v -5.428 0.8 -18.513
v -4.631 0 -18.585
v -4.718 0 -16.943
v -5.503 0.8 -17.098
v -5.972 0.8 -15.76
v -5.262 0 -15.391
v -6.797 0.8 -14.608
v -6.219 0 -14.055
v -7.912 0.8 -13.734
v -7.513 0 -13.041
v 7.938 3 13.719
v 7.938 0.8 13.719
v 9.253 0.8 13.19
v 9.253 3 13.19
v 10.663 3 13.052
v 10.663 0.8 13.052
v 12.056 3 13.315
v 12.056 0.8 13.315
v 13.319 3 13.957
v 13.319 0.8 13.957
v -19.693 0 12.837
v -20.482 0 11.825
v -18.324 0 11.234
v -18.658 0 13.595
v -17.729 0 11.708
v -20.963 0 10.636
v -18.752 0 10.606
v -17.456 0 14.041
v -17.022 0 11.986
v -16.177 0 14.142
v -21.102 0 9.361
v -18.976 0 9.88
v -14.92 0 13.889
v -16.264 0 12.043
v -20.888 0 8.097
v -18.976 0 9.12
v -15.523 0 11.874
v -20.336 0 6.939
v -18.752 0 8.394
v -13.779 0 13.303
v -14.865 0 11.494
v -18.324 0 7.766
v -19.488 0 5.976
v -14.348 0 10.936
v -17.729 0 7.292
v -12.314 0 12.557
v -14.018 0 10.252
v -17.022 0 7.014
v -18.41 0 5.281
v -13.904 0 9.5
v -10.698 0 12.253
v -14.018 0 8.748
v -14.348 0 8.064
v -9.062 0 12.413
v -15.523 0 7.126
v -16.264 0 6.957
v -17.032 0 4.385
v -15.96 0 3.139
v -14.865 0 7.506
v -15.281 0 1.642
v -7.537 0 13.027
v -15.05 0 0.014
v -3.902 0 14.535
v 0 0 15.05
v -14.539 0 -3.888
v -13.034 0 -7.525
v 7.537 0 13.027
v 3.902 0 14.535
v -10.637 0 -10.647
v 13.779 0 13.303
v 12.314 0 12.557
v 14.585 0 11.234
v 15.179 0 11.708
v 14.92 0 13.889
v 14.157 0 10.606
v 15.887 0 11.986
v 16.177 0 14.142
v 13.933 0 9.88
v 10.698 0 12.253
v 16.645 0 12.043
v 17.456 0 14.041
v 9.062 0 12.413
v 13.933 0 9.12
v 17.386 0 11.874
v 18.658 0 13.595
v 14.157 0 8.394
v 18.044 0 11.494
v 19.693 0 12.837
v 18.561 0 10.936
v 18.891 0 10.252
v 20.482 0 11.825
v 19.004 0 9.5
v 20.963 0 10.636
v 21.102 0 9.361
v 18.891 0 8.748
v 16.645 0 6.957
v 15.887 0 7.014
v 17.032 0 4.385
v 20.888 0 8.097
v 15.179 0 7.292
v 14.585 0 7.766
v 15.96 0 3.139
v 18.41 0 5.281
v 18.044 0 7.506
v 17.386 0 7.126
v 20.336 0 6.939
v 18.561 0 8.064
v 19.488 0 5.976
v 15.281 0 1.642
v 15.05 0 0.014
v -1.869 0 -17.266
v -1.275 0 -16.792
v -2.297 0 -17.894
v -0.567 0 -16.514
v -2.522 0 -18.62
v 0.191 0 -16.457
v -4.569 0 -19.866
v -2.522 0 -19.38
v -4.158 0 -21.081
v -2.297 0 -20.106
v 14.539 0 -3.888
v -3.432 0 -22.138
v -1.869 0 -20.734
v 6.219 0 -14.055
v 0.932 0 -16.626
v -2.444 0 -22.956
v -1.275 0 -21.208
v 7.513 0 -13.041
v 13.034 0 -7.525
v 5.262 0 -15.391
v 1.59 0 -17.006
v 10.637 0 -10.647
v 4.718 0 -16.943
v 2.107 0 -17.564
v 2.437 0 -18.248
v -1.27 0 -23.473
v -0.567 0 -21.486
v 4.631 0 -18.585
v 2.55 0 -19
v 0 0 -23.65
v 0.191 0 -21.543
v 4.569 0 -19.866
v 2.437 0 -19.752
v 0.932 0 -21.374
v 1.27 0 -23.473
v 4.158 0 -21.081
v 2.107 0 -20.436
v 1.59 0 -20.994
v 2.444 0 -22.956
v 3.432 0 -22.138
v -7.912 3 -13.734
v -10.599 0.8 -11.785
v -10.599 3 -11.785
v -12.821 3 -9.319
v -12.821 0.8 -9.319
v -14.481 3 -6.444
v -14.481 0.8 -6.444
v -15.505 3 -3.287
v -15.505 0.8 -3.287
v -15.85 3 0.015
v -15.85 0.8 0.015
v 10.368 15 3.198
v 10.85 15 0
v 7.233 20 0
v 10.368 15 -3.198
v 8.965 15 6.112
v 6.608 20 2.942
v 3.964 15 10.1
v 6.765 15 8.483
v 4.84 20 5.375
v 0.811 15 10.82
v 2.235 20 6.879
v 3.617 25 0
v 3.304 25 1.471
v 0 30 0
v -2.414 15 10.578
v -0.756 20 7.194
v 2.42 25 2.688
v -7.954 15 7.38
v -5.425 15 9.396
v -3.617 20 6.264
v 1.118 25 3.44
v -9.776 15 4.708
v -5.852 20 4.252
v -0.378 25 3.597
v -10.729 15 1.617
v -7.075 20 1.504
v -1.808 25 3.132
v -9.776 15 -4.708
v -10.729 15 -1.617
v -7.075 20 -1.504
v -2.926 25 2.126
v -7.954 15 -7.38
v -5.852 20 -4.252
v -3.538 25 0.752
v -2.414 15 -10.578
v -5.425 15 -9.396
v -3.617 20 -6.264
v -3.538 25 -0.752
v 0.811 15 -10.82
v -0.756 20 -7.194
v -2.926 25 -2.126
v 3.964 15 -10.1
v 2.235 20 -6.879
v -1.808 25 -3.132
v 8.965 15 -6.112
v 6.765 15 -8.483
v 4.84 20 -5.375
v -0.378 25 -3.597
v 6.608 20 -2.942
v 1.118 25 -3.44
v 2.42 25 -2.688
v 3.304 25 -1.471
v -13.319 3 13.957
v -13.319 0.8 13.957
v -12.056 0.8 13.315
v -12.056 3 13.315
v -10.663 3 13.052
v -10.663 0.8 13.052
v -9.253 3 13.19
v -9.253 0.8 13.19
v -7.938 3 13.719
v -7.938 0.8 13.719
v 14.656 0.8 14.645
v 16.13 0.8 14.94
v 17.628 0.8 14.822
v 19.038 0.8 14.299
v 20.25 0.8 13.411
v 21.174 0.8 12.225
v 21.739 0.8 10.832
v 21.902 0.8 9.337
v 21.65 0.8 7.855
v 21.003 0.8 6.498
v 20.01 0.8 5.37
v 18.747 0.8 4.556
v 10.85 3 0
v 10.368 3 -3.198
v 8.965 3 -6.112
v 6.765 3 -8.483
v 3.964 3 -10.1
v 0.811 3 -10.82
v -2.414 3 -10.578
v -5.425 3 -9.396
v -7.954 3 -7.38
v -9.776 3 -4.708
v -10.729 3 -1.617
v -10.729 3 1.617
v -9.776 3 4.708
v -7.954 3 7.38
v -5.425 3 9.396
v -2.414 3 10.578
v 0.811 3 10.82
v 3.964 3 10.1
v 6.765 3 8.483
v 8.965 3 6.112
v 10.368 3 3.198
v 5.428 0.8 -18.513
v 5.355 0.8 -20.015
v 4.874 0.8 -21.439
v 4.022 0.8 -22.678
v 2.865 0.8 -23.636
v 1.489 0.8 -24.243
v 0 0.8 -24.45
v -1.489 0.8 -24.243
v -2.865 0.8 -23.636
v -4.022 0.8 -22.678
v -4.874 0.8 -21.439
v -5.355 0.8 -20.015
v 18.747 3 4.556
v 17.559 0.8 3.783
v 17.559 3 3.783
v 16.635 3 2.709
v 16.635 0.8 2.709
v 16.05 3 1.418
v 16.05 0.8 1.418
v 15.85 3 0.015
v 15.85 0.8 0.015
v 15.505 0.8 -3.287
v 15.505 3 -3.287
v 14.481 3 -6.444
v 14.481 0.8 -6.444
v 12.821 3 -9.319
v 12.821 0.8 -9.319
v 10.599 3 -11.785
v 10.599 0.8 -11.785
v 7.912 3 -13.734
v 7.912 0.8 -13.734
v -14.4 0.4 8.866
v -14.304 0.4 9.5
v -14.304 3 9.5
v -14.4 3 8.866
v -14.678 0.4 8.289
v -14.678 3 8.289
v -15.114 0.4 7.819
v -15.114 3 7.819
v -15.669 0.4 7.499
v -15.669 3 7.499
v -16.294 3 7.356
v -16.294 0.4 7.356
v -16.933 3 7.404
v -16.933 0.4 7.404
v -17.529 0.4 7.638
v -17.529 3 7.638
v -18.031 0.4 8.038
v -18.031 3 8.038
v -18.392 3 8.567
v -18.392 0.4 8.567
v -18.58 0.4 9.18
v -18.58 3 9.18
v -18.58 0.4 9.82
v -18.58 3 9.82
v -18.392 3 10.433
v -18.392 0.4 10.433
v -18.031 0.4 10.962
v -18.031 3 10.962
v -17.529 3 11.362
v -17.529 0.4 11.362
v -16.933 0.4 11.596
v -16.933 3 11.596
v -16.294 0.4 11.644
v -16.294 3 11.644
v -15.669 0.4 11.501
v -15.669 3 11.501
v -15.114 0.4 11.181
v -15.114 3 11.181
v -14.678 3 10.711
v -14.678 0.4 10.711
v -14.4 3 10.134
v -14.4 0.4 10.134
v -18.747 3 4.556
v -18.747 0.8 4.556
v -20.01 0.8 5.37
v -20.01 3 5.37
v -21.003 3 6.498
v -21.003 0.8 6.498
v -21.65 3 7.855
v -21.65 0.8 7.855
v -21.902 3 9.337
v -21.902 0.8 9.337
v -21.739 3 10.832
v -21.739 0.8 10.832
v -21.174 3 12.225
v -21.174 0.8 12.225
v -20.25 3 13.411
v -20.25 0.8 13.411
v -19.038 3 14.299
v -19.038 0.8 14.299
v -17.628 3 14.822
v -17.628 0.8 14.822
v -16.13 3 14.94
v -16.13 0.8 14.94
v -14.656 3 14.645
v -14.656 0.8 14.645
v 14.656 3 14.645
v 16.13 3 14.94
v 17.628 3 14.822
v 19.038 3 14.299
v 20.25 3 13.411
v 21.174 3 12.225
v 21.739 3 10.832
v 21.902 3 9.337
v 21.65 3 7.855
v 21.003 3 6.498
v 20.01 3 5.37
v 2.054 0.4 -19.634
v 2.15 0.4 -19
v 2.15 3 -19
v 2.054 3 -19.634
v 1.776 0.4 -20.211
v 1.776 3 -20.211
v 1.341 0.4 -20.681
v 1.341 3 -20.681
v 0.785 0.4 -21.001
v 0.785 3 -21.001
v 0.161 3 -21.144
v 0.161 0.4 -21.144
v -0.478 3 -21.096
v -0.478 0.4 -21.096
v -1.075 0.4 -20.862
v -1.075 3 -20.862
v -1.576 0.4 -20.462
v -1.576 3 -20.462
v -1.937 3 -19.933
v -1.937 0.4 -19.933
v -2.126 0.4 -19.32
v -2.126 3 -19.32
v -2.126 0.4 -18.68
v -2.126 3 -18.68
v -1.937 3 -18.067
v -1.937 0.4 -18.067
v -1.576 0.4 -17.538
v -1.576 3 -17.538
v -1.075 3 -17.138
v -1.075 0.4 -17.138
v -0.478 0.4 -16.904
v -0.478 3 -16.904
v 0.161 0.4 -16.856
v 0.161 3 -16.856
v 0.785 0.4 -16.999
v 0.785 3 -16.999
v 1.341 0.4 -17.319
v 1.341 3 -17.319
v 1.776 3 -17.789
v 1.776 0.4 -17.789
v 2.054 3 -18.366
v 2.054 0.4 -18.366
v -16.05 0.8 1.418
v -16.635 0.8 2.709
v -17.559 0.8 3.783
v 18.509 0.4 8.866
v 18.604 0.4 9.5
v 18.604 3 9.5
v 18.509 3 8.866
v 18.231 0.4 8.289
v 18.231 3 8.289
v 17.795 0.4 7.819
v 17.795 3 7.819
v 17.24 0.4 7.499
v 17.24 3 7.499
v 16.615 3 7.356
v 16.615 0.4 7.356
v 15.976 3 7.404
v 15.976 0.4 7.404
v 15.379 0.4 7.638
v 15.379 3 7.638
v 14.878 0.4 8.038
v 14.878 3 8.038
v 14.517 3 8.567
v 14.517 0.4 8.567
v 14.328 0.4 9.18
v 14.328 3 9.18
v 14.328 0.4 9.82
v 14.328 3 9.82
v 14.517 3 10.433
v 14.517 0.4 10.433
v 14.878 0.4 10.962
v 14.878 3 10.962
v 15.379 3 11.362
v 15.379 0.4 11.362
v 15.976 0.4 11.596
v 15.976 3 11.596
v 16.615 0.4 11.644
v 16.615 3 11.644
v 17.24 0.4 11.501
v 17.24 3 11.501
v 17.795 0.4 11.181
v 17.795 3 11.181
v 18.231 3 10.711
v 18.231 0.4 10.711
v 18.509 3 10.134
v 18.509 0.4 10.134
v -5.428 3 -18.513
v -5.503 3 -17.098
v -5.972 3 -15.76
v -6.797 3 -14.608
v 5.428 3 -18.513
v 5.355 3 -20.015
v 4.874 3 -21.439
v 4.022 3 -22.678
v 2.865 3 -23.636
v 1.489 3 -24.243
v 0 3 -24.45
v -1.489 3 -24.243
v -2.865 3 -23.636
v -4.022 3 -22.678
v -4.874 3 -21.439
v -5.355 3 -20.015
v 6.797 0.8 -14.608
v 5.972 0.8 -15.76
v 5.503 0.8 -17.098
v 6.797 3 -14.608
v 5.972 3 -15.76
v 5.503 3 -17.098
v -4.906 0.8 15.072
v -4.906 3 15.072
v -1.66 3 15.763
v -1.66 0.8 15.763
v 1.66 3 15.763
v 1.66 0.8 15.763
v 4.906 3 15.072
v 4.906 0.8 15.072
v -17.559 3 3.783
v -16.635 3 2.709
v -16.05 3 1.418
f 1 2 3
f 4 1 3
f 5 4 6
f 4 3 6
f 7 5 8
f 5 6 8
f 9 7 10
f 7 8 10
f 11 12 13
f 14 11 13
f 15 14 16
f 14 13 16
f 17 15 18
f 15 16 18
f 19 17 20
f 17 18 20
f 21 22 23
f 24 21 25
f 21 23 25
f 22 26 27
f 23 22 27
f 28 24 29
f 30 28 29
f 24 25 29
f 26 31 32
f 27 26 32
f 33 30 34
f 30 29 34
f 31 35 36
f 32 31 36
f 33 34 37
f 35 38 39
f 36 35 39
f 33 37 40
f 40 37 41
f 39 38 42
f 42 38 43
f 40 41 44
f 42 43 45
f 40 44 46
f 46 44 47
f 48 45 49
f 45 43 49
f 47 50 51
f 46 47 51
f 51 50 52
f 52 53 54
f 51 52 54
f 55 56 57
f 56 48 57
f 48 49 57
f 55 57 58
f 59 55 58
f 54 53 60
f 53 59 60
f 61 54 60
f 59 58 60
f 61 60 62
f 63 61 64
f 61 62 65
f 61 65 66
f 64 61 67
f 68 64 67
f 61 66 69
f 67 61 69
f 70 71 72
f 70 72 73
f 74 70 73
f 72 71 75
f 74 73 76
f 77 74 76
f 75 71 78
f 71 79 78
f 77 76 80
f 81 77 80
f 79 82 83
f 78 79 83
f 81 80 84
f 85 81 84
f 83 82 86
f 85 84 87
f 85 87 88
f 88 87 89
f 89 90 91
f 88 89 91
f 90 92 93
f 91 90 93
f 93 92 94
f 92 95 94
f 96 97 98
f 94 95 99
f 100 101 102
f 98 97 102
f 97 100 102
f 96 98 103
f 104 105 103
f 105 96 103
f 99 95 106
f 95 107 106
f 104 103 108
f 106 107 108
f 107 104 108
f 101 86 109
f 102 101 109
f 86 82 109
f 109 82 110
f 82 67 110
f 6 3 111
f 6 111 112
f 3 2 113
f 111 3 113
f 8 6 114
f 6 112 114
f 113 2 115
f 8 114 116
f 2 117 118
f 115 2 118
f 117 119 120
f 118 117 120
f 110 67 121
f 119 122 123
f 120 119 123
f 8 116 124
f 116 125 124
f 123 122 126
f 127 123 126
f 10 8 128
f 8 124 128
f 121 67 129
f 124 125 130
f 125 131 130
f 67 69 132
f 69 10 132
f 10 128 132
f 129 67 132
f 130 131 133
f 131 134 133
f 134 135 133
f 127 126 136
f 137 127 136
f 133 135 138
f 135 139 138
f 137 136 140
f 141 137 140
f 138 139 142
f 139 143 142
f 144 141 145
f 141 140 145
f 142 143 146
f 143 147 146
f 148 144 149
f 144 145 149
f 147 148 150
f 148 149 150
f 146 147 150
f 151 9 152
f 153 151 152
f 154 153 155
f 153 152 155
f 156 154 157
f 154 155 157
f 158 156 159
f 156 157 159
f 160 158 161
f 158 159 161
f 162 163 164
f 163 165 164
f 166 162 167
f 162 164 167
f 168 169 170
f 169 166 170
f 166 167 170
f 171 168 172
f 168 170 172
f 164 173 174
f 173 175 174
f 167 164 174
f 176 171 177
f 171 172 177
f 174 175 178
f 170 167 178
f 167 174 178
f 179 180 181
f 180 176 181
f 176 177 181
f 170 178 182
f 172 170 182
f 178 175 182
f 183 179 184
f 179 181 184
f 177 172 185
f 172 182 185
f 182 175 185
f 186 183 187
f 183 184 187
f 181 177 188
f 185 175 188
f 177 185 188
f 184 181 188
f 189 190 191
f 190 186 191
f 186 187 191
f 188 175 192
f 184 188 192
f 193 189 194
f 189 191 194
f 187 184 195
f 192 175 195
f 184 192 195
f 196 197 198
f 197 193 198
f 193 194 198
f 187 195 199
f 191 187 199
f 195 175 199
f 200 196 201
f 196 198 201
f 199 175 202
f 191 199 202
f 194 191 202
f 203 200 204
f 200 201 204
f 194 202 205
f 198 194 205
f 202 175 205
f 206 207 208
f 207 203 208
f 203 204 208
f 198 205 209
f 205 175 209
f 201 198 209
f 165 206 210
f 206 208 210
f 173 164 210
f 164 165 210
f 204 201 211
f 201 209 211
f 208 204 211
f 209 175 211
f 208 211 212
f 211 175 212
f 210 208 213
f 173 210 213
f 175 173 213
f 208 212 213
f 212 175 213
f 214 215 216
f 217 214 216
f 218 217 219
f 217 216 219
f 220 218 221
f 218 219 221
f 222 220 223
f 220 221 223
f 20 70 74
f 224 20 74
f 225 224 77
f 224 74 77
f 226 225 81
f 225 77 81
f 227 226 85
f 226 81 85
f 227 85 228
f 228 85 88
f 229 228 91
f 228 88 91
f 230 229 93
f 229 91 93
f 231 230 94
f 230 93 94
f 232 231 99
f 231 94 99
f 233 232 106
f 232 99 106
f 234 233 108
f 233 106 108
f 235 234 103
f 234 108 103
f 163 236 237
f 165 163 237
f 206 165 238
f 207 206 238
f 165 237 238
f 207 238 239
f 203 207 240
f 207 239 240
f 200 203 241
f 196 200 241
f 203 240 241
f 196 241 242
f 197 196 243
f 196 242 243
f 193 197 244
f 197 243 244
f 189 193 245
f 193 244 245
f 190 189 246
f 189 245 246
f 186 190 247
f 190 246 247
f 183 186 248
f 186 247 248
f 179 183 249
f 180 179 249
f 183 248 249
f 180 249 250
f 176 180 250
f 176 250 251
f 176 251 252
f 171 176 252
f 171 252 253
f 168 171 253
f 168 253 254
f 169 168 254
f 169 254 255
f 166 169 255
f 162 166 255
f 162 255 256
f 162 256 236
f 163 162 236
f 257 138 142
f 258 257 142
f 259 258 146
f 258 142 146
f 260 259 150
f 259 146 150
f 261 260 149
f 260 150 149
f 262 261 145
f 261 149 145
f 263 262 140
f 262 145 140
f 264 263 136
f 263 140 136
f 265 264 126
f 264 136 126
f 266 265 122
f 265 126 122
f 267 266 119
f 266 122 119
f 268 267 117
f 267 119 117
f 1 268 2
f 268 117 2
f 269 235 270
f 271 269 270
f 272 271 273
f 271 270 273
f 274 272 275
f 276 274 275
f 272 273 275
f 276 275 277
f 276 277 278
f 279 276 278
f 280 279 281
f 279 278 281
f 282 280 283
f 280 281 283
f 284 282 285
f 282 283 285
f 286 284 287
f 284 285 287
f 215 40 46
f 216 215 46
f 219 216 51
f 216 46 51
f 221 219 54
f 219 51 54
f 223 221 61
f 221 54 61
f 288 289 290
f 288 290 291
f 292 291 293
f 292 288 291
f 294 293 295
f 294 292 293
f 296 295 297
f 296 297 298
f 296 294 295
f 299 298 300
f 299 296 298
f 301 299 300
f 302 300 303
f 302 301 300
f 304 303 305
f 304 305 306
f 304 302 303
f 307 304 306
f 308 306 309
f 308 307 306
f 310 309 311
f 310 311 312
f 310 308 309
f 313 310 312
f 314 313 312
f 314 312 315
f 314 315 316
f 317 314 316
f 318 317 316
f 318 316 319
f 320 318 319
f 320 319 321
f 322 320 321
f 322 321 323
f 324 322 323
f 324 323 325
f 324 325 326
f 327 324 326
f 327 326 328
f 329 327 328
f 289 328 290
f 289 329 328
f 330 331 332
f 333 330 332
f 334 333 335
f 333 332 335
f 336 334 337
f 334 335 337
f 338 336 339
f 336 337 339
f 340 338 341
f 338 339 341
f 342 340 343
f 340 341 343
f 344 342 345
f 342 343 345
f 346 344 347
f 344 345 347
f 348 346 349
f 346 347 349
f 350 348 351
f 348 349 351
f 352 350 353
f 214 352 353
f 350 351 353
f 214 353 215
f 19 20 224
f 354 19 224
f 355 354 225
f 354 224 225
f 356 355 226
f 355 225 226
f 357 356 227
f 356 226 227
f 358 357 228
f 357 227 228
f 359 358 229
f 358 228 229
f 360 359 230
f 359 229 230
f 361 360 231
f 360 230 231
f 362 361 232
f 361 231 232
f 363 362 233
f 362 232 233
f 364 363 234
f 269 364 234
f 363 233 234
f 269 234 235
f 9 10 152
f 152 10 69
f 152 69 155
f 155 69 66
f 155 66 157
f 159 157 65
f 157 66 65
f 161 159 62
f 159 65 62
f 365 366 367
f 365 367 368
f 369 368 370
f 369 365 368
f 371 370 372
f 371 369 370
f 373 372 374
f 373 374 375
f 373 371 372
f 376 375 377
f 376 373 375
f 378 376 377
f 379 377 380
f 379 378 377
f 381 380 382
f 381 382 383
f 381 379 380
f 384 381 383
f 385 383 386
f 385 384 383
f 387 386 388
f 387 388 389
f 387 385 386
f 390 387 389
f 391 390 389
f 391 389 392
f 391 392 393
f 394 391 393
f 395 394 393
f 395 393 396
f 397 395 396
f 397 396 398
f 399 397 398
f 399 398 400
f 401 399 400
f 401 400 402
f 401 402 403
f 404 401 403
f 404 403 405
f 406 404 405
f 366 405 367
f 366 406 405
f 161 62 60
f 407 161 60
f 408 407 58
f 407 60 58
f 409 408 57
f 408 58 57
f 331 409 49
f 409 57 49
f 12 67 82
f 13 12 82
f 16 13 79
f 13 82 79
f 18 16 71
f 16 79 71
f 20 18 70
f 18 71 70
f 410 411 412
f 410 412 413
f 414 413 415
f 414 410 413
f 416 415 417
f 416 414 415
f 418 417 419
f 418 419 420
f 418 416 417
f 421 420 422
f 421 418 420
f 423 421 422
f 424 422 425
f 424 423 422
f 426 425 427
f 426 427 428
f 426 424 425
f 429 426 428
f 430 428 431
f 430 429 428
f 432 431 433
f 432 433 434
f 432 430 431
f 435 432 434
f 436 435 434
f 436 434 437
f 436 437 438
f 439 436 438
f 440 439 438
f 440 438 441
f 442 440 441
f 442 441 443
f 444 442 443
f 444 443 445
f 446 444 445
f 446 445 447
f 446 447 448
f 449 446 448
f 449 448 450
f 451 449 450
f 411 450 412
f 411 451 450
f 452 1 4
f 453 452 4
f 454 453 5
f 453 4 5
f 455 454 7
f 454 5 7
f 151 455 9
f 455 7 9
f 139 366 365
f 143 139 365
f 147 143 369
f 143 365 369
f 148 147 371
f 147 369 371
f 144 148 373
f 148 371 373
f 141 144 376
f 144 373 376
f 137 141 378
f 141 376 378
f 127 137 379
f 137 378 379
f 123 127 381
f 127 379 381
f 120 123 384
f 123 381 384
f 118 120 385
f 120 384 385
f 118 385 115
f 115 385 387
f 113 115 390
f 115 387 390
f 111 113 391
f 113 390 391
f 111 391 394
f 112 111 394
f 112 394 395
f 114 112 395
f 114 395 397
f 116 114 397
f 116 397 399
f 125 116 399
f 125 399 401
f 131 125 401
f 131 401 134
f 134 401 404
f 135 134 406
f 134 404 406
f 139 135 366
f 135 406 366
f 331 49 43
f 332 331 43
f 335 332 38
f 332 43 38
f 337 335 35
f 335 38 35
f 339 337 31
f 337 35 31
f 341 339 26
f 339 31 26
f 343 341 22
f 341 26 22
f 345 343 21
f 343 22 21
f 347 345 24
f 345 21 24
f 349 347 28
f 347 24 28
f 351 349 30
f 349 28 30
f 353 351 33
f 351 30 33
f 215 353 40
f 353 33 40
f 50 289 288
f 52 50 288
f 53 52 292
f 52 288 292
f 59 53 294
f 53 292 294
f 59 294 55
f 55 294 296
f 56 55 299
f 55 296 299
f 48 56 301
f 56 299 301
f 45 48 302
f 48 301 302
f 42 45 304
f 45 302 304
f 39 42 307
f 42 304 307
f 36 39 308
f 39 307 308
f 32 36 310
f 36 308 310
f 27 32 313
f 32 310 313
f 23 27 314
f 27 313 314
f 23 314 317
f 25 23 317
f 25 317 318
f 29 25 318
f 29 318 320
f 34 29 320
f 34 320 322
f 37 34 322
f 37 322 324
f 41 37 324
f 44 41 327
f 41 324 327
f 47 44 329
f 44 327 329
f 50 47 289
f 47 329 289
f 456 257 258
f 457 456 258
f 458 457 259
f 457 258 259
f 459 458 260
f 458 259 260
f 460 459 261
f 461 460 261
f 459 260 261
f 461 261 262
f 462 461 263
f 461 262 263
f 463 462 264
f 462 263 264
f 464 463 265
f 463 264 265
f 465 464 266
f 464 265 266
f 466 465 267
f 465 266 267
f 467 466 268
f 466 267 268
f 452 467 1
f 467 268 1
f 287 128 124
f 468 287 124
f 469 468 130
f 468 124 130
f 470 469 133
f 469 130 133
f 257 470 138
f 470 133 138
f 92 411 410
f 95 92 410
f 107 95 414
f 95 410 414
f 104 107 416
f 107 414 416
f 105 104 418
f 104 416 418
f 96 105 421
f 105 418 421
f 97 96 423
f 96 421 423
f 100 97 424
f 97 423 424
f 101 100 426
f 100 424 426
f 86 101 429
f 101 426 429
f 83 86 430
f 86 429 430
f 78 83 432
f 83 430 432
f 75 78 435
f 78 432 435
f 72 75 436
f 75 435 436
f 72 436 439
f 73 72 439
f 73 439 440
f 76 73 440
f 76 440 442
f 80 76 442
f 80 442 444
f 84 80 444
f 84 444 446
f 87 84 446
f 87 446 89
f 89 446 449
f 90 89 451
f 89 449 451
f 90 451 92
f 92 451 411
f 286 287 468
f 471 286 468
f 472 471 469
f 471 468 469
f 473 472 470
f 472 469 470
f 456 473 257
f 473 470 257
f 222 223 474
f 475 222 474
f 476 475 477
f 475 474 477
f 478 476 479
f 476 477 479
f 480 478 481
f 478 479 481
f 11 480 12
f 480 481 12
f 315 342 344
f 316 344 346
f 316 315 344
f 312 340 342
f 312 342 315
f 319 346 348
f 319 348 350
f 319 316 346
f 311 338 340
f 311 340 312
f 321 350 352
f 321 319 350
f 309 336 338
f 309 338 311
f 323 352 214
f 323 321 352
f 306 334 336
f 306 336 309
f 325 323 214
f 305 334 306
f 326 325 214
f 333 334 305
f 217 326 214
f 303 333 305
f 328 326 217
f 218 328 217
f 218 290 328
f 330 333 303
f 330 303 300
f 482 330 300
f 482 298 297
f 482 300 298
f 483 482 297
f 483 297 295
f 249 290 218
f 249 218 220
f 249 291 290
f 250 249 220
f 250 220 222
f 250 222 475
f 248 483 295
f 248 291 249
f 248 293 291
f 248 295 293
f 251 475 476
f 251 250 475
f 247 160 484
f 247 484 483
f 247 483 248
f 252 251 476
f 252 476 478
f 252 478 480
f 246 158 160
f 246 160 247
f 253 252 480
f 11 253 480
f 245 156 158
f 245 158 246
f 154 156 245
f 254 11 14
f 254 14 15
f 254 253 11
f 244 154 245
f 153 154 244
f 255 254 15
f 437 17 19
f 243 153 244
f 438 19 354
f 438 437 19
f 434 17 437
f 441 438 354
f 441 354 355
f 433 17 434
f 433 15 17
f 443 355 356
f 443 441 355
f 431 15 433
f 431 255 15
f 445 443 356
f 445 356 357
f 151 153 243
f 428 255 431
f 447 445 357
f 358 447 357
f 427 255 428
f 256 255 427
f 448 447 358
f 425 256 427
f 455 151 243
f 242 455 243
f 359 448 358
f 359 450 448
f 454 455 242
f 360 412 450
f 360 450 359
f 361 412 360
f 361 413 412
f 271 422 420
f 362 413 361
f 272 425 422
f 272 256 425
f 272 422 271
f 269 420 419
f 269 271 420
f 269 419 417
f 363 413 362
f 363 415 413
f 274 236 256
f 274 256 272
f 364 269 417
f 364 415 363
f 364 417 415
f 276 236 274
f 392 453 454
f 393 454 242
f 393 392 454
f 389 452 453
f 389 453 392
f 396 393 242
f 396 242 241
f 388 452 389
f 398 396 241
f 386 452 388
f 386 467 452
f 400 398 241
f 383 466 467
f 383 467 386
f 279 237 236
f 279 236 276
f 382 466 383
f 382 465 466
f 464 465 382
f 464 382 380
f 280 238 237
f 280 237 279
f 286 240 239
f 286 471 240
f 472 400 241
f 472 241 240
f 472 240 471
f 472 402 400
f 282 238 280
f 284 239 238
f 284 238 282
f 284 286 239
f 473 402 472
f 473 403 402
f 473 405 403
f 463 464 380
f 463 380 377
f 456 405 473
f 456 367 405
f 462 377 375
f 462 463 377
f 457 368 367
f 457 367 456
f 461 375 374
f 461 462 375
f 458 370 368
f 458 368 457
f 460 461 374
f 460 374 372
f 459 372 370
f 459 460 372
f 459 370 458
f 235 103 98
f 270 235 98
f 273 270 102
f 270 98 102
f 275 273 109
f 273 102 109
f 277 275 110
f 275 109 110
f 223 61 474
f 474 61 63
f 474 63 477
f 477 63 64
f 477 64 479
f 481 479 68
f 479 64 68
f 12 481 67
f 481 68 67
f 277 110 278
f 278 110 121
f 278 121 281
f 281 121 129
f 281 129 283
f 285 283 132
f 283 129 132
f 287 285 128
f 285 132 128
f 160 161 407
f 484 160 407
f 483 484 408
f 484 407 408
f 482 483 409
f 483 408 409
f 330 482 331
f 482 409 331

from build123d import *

# Parameters (mm, degrees)
SKETCH1_R           = 10.85
SKETCH1_R_2         = 2.15
BOSS_EXTRUDE1_DEPTH = 3
SKETCH1_2_R         = 10.85
BOSS_EXTRUDE2_DEPTH = 15
CHAMFER1_SIZE       = 0.8
CHAMFER2_SIZE       = 0.4


with BuildPart() as part:
    # Sketch1 → Boss-Extrude1 (new body)
    with BuildSketch(Plane(origin=(0, 0, 0), x_dir=(1, 0, 0), z_dir=(0, 1, 0))):
        with BuildLine():
            ThreePointArc((5.42820267, 18.513054646), (0, 24.45), (-5.42820267, 18.513054646))
            ThreePointArc((-5.42820267, 18.513054646), (-5.97168494, 15.760391094), (-7.912232668, 13.73386596))
            ThreePointArc((-7.912232668, 13.73386596), (-13.72650265, 7.925), (-15.849993148, -0.014738489))
            ThreePointArc((-15.849993148, -0.014738489), (-16.634741531, -2.708564686), (-18.74687696, -4.555565914))
            ThreePointArc((-18.74687696, -4.555565914), (-21.174321123, -12.225), (-13.31867429, -13.957488732))
            ThreePointArc((-13.31867429, -13.957488732), (-10.663056591, -13.051826408), (-7.937760479, -13.719127471))
            ThreePointArc((-7.937760479, -13.719127471), (0, -15.85), (7.937760479, -13.719127471))
            ThreePointArc((7.937760479, -13.719127471), (10.663056591, -13.051826408), (13.31867429, -13.957488732))
            ThreePointArc((13.31867429, -13.957488732), (21.174321123, -12.225), (18.74687696, -4.555565914))
            ThreePointArc((18.74687696, -4.555565914), (16.634741531, -2.708564686), (15.849993148, -0.014738489))
            ThreePointArc((15.849993148, -0.014738489), (13.72650265, 7.925), (7.912232668, 13.73386596))
            ThreePointArc((7.912232668, 13.73386596), (5.97168494, 15.760391094), (5.42820267, 18.513054646))
        make_face()
        Circle(SKETCH1_R, mode=Mode.SUBTRACT)
        with Locations((0, 19)):
            Circle(SKETCH1_R_2, mode=Mode.SUBTRACT)
        with Locations((16.454482672, -9.5)):
            Circle(SKETCH1_R_2, mode=Mode.SUBTRACT)
        with Locations((-16.454482672, -9.5)):
            Circle(SKETCH1_R_2, mode=Mode.SUBTRACT)
    extrude(amount=BOSS_EXTRUDE1_DEPTH)

    # Sketch1<2> → Boss-Extrude2 (add)
    with BuildSketch(Plane(origin=(0, 0, 0), x_dir=(1, 0, 0), z_dir=(0, 1, 0))):
        Circle(SKETCH1_2_R)
    extrude(amount=BOSS_EXTRUDE2_DEPTH)

    # Sketch2 → Revolve1 (revolve)
    with BuildSketch(Plane.XY):
        Polygon((0, 15), (10.85, 15), (0, 30), align=None)
    revolve(axis=Axis((0, 18.413549721, 0), (0, -1, 0)))

    # Chamfer1
    chamfer1_edges = [part.edges().sort_by_distance(p)[0] for p in [
        (16.634741531, 0, 2.708564686),
        (21.174321123, 0, 12.225),
        (10.663056591, 0, 13.051826408),
        (0, 0, 15.85),
        (-10.663056591, 0, 13.051826408),
        (-21.174321123, 0, 12.225),
        (-16.634741531, 0, 2.708564686),
        (-13.72650265, 0, -7.925),
        (-5.97168494, 0, -15.760391094),
        (0, 0, -24.45),
        (5.97168494, 0, -15.760391094),
        (13.72650265, 0, -7.925),
    ]]
    chamfer(chamfer1_edges, length=CHAMFER1_SIZE)

    # Chamfer2
    chamfer2_edges = [part.edges().sort_by_distance(p)[0] for p in [
        (-2.15, 0, -19),
        (14.304482672, 0, 9.5),
        (-18.604482672, 0, 9.5),
    ]]
    chamfer(chamfer2_edges, length=CHAMFER2_SIZE)


solid = part.part
